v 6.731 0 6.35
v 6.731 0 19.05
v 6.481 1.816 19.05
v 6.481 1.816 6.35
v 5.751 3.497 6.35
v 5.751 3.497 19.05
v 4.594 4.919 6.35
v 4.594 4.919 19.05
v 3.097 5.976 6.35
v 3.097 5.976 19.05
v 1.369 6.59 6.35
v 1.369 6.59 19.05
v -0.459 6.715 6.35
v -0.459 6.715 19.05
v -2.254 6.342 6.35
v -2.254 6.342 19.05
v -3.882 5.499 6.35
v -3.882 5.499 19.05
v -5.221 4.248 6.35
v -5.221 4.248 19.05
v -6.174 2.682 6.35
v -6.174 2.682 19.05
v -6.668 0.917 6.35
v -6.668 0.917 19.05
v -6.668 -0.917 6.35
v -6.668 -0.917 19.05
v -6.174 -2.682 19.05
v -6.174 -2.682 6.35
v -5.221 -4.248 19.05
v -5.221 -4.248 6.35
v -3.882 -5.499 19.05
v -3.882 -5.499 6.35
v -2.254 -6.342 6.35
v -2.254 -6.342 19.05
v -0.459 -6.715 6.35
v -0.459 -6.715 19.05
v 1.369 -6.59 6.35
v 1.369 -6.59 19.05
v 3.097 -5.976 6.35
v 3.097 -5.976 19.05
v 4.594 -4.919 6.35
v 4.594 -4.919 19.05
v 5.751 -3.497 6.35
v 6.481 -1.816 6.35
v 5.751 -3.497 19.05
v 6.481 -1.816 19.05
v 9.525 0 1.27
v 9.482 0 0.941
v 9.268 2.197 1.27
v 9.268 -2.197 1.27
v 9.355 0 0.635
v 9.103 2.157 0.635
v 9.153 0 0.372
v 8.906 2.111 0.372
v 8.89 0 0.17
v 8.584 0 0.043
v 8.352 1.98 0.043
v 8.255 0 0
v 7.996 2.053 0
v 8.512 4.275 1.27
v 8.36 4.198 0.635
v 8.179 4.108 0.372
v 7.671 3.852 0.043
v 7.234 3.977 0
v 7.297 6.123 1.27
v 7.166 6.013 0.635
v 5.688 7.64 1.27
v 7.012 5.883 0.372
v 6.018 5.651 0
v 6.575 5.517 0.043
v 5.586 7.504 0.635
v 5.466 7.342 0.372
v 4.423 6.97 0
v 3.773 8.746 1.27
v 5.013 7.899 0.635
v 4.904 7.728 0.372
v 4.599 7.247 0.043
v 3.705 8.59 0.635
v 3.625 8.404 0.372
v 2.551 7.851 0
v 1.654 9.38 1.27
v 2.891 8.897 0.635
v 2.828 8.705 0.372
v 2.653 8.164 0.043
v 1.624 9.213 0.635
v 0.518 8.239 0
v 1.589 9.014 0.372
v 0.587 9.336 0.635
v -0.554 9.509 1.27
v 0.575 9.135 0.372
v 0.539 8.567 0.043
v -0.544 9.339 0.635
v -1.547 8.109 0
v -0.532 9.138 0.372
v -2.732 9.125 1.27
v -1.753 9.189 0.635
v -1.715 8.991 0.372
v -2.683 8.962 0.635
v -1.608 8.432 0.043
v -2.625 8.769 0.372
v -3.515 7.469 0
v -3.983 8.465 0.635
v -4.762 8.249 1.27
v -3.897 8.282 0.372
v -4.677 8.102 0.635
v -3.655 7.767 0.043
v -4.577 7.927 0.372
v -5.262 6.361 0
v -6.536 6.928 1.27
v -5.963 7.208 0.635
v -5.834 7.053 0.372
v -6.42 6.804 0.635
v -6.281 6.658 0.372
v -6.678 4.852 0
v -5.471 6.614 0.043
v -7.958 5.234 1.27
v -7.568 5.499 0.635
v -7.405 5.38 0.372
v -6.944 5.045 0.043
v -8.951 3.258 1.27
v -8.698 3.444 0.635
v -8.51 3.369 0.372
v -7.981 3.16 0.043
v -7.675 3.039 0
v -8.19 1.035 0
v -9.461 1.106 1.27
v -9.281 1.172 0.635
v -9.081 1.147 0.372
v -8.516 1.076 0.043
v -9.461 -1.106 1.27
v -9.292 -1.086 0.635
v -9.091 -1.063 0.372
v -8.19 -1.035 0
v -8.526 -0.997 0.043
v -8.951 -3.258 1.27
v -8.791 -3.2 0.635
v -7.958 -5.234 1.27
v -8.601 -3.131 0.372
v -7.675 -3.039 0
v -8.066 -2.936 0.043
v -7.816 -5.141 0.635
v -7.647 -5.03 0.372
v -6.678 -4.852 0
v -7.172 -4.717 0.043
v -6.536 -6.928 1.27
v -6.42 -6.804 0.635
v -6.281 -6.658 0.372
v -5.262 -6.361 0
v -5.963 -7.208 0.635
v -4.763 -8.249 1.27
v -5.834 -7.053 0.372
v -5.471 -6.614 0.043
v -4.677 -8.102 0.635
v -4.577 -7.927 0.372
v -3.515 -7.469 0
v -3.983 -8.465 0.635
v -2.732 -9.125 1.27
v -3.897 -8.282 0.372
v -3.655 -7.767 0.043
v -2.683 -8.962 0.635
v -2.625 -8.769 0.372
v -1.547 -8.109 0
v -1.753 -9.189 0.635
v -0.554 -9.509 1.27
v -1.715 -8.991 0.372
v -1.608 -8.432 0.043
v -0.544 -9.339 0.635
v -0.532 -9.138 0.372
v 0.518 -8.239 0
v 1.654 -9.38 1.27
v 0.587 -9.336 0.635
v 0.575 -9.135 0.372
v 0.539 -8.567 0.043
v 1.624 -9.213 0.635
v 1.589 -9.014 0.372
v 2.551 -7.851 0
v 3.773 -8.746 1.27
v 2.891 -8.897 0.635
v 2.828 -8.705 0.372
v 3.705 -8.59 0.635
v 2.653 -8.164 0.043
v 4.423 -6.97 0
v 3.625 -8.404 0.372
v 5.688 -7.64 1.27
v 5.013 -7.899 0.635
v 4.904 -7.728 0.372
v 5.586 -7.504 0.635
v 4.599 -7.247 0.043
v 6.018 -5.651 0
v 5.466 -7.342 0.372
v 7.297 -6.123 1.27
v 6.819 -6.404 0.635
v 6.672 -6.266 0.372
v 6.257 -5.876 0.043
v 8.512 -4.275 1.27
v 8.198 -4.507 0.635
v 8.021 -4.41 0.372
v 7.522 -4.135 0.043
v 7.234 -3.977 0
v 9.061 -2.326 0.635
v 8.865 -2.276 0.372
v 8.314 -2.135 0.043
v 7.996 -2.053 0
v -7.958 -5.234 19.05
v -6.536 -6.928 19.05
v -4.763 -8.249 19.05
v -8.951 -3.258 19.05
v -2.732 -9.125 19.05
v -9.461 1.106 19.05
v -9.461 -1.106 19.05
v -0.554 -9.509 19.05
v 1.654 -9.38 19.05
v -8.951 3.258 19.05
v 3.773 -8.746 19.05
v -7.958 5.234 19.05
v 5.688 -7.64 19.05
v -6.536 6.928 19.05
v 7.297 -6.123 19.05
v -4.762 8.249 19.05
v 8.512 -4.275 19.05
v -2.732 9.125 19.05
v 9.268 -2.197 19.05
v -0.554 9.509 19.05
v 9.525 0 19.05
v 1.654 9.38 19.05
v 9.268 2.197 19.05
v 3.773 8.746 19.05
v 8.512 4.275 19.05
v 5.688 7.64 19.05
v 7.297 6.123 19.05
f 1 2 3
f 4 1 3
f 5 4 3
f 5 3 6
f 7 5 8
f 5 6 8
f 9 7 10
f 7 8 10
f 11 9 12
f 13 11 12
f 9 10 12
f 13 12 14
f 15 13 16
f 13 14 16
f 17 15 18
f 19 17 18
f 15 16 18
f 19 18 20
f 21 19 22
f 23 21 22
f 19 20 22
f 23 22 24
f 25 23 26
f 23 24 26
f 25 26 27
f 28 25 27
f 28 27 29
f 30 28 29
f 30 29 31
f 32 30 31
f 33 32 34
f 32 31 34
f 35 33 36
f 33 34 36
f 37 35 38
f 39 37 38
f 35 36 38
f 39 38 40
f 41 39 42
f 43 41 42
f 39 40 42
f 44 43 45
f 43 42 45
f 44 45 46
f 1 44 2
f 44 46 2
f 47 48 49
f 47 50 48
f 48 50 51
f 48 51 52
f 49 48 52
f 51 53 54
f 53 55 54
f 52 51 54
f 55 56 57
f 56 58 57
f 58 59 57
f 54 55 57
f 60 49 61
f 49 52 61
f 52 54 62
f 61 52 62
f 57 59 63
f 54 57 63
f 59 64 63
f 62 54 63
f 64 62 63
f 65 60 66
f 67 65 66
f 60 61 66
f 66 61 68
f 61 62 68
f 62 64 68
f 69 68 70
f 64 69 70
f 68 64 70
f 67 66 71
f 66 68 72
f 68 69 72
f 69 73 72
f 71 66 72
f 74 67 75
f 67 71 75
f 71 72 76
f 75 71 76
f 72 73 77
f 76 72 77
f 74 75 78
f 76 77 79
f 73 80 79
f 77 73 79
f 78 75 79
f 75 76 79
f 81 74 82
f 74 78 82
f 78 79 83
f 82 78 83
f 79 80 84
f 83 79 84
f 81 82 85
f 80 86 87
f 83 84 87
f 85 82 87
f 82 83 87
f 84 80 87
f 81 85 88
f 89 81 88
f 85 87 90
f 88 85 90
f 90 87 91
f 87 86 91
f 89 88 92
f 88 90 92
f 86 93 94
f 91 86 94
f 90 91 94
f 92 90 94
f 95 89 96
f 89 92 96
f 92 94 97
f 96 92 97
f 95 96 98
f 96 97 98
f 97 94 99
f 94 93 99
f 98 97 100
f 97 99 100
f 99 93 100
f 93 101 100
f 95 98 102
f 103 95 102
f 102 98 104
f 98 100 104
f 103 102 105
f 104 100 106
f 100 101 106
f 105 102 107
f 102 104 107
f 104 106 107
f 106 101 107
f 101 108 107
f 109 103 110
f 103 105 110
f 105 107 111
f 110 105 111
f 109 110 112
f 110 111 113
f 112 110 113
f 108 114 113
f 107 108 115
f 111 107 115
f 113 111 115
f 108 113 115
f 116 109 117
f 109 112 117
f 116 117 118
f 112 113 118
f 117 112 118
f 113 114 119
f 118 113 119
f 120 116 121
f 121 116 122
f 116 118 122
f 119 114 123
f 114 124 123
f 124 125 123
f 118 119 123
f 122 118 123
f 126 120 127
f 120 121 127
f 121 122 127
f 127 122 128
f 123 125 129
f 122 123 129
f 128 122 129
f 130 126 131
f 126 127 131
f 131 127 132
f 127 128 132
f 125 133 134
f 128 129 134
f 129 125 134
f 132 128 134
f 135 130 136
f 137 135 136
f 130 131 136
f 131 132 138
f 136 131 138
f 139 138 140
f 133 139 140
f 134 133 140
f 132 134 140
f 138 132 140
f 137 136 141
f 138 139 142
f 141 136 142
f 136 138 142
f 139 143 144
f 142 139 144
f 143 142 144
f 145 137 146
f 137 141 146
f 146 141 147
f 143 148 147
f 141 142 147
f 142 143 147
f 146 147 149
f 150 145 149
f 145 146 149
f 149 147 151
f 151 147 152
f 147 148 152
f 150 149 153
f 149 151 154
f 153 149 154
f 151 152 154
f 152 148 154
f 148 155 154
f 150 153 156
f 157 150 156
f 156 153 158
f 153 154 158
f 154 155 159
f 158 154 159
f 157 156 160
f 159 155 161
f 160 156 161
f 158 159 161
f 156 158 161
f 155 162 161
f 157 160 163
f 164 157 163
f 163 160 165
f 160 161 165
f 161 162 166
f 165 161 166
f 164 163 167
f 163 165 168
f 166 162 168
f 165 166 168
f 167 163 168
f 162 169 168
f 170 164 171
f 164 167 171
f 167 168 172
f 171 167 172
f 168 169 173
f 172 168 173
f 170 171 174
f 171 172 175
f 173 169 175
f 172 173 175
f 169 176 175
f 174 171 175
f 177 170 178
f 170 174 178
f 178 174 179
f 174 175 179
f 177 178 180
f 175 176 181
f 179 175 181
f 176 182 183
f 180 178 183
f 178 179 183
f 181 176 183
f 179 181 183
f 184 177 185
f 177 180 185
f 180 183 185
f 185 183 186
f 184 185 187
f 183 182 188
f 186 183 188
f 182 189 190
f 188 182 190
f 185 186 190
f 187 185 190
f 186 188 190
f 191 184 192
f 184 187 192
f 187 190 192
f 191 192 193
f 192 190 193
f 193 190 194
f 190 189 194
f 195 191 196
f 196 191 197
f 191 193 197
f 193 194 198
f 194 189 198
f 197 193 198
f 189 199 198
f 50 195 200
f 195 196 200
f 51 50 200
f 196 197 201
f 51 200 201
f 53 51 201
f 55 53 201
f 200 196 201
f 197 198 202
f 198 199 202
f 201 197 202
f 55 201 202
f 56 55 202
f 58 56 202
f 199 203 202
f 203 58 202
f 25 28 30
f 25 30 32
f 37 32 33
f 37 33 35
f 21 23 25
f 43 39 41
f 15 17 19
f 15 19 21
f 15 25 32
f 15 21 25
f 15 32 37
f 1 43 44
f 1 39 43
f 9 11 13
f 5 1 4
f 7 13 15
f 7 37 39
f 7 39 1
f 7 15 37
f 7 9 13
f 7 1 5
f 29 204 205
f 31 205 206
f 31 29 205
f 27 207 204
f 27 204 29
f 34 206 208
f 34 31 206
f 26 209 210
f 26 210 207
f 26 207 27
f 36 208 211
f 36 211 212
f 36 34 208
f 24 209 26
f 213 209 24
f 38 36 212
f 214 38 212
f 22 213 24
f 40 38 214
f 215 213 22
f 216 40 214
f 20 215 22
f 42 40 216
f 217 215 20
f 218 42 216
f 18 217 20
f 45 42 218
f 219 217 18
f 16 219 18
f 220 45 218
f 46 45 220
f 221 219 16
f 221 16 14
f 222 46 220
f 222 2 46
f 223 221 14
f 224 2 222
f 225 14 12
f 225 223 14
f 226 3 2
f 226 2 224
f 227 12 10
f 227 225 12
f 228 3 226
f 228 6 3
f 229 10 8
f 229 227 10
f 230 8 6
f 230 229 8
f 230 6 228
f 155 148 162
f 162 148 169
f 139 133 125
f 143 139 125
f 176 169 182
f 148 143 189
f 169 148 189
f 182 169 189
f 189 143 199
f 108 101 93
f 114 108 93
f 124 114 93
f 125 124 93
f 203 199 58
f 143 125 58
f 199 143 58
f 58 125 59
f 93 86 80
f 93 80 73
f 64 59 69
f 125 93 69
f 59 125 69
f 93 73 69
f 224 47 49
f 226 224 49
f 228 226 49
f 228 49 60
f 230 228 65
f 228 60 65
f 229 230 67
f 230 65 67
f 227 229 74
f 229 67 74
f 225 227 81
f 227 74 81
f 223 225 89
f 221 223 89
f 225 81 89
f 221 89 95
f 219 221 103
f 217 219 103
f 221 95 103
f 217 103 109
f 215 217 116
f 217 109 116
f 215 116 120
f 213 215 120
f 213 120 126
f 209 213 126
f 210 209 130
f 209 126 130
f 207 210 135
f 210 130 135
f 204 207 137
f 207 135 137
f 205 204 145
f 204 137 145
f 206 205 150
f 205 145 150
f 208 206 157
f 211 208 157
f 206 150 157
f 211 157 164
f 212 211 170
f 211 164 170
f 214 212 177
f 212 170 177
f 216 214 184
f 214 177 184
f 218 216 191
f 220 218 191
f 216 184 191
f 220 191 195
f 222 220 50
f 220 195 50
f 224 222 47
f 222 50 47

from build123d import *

# Parameters (mm, degrees)
F0_R     = 9.525
F1_DEPTH = 19.05
F2_R     = 6.731
F3_DEPTH = 12.7
F4_R     = 1.27


with BuildPart() as f1:
    # F0 (on Top) → F1 (new body)
    with BuildSketch(Plane.XY):
        Circle(F0_R)
    extrude(amount=F1_DEPTH)

    # F2 (on face) → F3 (cut)
    with BuildSketch(Plane.XY.offset(19.05)):
        Circle(F2_R)
    extrude(amount=-F3_DEPTH, mode=Mode.SUBTRACT)

    # F4
    f4_edges = [f1.edges().sort_by_distance(p)[0] for p in [
        (-9.525, 0, 0),
    ]]
    fillet(f4_edges, radius=F4_R)


solid = f1.part
